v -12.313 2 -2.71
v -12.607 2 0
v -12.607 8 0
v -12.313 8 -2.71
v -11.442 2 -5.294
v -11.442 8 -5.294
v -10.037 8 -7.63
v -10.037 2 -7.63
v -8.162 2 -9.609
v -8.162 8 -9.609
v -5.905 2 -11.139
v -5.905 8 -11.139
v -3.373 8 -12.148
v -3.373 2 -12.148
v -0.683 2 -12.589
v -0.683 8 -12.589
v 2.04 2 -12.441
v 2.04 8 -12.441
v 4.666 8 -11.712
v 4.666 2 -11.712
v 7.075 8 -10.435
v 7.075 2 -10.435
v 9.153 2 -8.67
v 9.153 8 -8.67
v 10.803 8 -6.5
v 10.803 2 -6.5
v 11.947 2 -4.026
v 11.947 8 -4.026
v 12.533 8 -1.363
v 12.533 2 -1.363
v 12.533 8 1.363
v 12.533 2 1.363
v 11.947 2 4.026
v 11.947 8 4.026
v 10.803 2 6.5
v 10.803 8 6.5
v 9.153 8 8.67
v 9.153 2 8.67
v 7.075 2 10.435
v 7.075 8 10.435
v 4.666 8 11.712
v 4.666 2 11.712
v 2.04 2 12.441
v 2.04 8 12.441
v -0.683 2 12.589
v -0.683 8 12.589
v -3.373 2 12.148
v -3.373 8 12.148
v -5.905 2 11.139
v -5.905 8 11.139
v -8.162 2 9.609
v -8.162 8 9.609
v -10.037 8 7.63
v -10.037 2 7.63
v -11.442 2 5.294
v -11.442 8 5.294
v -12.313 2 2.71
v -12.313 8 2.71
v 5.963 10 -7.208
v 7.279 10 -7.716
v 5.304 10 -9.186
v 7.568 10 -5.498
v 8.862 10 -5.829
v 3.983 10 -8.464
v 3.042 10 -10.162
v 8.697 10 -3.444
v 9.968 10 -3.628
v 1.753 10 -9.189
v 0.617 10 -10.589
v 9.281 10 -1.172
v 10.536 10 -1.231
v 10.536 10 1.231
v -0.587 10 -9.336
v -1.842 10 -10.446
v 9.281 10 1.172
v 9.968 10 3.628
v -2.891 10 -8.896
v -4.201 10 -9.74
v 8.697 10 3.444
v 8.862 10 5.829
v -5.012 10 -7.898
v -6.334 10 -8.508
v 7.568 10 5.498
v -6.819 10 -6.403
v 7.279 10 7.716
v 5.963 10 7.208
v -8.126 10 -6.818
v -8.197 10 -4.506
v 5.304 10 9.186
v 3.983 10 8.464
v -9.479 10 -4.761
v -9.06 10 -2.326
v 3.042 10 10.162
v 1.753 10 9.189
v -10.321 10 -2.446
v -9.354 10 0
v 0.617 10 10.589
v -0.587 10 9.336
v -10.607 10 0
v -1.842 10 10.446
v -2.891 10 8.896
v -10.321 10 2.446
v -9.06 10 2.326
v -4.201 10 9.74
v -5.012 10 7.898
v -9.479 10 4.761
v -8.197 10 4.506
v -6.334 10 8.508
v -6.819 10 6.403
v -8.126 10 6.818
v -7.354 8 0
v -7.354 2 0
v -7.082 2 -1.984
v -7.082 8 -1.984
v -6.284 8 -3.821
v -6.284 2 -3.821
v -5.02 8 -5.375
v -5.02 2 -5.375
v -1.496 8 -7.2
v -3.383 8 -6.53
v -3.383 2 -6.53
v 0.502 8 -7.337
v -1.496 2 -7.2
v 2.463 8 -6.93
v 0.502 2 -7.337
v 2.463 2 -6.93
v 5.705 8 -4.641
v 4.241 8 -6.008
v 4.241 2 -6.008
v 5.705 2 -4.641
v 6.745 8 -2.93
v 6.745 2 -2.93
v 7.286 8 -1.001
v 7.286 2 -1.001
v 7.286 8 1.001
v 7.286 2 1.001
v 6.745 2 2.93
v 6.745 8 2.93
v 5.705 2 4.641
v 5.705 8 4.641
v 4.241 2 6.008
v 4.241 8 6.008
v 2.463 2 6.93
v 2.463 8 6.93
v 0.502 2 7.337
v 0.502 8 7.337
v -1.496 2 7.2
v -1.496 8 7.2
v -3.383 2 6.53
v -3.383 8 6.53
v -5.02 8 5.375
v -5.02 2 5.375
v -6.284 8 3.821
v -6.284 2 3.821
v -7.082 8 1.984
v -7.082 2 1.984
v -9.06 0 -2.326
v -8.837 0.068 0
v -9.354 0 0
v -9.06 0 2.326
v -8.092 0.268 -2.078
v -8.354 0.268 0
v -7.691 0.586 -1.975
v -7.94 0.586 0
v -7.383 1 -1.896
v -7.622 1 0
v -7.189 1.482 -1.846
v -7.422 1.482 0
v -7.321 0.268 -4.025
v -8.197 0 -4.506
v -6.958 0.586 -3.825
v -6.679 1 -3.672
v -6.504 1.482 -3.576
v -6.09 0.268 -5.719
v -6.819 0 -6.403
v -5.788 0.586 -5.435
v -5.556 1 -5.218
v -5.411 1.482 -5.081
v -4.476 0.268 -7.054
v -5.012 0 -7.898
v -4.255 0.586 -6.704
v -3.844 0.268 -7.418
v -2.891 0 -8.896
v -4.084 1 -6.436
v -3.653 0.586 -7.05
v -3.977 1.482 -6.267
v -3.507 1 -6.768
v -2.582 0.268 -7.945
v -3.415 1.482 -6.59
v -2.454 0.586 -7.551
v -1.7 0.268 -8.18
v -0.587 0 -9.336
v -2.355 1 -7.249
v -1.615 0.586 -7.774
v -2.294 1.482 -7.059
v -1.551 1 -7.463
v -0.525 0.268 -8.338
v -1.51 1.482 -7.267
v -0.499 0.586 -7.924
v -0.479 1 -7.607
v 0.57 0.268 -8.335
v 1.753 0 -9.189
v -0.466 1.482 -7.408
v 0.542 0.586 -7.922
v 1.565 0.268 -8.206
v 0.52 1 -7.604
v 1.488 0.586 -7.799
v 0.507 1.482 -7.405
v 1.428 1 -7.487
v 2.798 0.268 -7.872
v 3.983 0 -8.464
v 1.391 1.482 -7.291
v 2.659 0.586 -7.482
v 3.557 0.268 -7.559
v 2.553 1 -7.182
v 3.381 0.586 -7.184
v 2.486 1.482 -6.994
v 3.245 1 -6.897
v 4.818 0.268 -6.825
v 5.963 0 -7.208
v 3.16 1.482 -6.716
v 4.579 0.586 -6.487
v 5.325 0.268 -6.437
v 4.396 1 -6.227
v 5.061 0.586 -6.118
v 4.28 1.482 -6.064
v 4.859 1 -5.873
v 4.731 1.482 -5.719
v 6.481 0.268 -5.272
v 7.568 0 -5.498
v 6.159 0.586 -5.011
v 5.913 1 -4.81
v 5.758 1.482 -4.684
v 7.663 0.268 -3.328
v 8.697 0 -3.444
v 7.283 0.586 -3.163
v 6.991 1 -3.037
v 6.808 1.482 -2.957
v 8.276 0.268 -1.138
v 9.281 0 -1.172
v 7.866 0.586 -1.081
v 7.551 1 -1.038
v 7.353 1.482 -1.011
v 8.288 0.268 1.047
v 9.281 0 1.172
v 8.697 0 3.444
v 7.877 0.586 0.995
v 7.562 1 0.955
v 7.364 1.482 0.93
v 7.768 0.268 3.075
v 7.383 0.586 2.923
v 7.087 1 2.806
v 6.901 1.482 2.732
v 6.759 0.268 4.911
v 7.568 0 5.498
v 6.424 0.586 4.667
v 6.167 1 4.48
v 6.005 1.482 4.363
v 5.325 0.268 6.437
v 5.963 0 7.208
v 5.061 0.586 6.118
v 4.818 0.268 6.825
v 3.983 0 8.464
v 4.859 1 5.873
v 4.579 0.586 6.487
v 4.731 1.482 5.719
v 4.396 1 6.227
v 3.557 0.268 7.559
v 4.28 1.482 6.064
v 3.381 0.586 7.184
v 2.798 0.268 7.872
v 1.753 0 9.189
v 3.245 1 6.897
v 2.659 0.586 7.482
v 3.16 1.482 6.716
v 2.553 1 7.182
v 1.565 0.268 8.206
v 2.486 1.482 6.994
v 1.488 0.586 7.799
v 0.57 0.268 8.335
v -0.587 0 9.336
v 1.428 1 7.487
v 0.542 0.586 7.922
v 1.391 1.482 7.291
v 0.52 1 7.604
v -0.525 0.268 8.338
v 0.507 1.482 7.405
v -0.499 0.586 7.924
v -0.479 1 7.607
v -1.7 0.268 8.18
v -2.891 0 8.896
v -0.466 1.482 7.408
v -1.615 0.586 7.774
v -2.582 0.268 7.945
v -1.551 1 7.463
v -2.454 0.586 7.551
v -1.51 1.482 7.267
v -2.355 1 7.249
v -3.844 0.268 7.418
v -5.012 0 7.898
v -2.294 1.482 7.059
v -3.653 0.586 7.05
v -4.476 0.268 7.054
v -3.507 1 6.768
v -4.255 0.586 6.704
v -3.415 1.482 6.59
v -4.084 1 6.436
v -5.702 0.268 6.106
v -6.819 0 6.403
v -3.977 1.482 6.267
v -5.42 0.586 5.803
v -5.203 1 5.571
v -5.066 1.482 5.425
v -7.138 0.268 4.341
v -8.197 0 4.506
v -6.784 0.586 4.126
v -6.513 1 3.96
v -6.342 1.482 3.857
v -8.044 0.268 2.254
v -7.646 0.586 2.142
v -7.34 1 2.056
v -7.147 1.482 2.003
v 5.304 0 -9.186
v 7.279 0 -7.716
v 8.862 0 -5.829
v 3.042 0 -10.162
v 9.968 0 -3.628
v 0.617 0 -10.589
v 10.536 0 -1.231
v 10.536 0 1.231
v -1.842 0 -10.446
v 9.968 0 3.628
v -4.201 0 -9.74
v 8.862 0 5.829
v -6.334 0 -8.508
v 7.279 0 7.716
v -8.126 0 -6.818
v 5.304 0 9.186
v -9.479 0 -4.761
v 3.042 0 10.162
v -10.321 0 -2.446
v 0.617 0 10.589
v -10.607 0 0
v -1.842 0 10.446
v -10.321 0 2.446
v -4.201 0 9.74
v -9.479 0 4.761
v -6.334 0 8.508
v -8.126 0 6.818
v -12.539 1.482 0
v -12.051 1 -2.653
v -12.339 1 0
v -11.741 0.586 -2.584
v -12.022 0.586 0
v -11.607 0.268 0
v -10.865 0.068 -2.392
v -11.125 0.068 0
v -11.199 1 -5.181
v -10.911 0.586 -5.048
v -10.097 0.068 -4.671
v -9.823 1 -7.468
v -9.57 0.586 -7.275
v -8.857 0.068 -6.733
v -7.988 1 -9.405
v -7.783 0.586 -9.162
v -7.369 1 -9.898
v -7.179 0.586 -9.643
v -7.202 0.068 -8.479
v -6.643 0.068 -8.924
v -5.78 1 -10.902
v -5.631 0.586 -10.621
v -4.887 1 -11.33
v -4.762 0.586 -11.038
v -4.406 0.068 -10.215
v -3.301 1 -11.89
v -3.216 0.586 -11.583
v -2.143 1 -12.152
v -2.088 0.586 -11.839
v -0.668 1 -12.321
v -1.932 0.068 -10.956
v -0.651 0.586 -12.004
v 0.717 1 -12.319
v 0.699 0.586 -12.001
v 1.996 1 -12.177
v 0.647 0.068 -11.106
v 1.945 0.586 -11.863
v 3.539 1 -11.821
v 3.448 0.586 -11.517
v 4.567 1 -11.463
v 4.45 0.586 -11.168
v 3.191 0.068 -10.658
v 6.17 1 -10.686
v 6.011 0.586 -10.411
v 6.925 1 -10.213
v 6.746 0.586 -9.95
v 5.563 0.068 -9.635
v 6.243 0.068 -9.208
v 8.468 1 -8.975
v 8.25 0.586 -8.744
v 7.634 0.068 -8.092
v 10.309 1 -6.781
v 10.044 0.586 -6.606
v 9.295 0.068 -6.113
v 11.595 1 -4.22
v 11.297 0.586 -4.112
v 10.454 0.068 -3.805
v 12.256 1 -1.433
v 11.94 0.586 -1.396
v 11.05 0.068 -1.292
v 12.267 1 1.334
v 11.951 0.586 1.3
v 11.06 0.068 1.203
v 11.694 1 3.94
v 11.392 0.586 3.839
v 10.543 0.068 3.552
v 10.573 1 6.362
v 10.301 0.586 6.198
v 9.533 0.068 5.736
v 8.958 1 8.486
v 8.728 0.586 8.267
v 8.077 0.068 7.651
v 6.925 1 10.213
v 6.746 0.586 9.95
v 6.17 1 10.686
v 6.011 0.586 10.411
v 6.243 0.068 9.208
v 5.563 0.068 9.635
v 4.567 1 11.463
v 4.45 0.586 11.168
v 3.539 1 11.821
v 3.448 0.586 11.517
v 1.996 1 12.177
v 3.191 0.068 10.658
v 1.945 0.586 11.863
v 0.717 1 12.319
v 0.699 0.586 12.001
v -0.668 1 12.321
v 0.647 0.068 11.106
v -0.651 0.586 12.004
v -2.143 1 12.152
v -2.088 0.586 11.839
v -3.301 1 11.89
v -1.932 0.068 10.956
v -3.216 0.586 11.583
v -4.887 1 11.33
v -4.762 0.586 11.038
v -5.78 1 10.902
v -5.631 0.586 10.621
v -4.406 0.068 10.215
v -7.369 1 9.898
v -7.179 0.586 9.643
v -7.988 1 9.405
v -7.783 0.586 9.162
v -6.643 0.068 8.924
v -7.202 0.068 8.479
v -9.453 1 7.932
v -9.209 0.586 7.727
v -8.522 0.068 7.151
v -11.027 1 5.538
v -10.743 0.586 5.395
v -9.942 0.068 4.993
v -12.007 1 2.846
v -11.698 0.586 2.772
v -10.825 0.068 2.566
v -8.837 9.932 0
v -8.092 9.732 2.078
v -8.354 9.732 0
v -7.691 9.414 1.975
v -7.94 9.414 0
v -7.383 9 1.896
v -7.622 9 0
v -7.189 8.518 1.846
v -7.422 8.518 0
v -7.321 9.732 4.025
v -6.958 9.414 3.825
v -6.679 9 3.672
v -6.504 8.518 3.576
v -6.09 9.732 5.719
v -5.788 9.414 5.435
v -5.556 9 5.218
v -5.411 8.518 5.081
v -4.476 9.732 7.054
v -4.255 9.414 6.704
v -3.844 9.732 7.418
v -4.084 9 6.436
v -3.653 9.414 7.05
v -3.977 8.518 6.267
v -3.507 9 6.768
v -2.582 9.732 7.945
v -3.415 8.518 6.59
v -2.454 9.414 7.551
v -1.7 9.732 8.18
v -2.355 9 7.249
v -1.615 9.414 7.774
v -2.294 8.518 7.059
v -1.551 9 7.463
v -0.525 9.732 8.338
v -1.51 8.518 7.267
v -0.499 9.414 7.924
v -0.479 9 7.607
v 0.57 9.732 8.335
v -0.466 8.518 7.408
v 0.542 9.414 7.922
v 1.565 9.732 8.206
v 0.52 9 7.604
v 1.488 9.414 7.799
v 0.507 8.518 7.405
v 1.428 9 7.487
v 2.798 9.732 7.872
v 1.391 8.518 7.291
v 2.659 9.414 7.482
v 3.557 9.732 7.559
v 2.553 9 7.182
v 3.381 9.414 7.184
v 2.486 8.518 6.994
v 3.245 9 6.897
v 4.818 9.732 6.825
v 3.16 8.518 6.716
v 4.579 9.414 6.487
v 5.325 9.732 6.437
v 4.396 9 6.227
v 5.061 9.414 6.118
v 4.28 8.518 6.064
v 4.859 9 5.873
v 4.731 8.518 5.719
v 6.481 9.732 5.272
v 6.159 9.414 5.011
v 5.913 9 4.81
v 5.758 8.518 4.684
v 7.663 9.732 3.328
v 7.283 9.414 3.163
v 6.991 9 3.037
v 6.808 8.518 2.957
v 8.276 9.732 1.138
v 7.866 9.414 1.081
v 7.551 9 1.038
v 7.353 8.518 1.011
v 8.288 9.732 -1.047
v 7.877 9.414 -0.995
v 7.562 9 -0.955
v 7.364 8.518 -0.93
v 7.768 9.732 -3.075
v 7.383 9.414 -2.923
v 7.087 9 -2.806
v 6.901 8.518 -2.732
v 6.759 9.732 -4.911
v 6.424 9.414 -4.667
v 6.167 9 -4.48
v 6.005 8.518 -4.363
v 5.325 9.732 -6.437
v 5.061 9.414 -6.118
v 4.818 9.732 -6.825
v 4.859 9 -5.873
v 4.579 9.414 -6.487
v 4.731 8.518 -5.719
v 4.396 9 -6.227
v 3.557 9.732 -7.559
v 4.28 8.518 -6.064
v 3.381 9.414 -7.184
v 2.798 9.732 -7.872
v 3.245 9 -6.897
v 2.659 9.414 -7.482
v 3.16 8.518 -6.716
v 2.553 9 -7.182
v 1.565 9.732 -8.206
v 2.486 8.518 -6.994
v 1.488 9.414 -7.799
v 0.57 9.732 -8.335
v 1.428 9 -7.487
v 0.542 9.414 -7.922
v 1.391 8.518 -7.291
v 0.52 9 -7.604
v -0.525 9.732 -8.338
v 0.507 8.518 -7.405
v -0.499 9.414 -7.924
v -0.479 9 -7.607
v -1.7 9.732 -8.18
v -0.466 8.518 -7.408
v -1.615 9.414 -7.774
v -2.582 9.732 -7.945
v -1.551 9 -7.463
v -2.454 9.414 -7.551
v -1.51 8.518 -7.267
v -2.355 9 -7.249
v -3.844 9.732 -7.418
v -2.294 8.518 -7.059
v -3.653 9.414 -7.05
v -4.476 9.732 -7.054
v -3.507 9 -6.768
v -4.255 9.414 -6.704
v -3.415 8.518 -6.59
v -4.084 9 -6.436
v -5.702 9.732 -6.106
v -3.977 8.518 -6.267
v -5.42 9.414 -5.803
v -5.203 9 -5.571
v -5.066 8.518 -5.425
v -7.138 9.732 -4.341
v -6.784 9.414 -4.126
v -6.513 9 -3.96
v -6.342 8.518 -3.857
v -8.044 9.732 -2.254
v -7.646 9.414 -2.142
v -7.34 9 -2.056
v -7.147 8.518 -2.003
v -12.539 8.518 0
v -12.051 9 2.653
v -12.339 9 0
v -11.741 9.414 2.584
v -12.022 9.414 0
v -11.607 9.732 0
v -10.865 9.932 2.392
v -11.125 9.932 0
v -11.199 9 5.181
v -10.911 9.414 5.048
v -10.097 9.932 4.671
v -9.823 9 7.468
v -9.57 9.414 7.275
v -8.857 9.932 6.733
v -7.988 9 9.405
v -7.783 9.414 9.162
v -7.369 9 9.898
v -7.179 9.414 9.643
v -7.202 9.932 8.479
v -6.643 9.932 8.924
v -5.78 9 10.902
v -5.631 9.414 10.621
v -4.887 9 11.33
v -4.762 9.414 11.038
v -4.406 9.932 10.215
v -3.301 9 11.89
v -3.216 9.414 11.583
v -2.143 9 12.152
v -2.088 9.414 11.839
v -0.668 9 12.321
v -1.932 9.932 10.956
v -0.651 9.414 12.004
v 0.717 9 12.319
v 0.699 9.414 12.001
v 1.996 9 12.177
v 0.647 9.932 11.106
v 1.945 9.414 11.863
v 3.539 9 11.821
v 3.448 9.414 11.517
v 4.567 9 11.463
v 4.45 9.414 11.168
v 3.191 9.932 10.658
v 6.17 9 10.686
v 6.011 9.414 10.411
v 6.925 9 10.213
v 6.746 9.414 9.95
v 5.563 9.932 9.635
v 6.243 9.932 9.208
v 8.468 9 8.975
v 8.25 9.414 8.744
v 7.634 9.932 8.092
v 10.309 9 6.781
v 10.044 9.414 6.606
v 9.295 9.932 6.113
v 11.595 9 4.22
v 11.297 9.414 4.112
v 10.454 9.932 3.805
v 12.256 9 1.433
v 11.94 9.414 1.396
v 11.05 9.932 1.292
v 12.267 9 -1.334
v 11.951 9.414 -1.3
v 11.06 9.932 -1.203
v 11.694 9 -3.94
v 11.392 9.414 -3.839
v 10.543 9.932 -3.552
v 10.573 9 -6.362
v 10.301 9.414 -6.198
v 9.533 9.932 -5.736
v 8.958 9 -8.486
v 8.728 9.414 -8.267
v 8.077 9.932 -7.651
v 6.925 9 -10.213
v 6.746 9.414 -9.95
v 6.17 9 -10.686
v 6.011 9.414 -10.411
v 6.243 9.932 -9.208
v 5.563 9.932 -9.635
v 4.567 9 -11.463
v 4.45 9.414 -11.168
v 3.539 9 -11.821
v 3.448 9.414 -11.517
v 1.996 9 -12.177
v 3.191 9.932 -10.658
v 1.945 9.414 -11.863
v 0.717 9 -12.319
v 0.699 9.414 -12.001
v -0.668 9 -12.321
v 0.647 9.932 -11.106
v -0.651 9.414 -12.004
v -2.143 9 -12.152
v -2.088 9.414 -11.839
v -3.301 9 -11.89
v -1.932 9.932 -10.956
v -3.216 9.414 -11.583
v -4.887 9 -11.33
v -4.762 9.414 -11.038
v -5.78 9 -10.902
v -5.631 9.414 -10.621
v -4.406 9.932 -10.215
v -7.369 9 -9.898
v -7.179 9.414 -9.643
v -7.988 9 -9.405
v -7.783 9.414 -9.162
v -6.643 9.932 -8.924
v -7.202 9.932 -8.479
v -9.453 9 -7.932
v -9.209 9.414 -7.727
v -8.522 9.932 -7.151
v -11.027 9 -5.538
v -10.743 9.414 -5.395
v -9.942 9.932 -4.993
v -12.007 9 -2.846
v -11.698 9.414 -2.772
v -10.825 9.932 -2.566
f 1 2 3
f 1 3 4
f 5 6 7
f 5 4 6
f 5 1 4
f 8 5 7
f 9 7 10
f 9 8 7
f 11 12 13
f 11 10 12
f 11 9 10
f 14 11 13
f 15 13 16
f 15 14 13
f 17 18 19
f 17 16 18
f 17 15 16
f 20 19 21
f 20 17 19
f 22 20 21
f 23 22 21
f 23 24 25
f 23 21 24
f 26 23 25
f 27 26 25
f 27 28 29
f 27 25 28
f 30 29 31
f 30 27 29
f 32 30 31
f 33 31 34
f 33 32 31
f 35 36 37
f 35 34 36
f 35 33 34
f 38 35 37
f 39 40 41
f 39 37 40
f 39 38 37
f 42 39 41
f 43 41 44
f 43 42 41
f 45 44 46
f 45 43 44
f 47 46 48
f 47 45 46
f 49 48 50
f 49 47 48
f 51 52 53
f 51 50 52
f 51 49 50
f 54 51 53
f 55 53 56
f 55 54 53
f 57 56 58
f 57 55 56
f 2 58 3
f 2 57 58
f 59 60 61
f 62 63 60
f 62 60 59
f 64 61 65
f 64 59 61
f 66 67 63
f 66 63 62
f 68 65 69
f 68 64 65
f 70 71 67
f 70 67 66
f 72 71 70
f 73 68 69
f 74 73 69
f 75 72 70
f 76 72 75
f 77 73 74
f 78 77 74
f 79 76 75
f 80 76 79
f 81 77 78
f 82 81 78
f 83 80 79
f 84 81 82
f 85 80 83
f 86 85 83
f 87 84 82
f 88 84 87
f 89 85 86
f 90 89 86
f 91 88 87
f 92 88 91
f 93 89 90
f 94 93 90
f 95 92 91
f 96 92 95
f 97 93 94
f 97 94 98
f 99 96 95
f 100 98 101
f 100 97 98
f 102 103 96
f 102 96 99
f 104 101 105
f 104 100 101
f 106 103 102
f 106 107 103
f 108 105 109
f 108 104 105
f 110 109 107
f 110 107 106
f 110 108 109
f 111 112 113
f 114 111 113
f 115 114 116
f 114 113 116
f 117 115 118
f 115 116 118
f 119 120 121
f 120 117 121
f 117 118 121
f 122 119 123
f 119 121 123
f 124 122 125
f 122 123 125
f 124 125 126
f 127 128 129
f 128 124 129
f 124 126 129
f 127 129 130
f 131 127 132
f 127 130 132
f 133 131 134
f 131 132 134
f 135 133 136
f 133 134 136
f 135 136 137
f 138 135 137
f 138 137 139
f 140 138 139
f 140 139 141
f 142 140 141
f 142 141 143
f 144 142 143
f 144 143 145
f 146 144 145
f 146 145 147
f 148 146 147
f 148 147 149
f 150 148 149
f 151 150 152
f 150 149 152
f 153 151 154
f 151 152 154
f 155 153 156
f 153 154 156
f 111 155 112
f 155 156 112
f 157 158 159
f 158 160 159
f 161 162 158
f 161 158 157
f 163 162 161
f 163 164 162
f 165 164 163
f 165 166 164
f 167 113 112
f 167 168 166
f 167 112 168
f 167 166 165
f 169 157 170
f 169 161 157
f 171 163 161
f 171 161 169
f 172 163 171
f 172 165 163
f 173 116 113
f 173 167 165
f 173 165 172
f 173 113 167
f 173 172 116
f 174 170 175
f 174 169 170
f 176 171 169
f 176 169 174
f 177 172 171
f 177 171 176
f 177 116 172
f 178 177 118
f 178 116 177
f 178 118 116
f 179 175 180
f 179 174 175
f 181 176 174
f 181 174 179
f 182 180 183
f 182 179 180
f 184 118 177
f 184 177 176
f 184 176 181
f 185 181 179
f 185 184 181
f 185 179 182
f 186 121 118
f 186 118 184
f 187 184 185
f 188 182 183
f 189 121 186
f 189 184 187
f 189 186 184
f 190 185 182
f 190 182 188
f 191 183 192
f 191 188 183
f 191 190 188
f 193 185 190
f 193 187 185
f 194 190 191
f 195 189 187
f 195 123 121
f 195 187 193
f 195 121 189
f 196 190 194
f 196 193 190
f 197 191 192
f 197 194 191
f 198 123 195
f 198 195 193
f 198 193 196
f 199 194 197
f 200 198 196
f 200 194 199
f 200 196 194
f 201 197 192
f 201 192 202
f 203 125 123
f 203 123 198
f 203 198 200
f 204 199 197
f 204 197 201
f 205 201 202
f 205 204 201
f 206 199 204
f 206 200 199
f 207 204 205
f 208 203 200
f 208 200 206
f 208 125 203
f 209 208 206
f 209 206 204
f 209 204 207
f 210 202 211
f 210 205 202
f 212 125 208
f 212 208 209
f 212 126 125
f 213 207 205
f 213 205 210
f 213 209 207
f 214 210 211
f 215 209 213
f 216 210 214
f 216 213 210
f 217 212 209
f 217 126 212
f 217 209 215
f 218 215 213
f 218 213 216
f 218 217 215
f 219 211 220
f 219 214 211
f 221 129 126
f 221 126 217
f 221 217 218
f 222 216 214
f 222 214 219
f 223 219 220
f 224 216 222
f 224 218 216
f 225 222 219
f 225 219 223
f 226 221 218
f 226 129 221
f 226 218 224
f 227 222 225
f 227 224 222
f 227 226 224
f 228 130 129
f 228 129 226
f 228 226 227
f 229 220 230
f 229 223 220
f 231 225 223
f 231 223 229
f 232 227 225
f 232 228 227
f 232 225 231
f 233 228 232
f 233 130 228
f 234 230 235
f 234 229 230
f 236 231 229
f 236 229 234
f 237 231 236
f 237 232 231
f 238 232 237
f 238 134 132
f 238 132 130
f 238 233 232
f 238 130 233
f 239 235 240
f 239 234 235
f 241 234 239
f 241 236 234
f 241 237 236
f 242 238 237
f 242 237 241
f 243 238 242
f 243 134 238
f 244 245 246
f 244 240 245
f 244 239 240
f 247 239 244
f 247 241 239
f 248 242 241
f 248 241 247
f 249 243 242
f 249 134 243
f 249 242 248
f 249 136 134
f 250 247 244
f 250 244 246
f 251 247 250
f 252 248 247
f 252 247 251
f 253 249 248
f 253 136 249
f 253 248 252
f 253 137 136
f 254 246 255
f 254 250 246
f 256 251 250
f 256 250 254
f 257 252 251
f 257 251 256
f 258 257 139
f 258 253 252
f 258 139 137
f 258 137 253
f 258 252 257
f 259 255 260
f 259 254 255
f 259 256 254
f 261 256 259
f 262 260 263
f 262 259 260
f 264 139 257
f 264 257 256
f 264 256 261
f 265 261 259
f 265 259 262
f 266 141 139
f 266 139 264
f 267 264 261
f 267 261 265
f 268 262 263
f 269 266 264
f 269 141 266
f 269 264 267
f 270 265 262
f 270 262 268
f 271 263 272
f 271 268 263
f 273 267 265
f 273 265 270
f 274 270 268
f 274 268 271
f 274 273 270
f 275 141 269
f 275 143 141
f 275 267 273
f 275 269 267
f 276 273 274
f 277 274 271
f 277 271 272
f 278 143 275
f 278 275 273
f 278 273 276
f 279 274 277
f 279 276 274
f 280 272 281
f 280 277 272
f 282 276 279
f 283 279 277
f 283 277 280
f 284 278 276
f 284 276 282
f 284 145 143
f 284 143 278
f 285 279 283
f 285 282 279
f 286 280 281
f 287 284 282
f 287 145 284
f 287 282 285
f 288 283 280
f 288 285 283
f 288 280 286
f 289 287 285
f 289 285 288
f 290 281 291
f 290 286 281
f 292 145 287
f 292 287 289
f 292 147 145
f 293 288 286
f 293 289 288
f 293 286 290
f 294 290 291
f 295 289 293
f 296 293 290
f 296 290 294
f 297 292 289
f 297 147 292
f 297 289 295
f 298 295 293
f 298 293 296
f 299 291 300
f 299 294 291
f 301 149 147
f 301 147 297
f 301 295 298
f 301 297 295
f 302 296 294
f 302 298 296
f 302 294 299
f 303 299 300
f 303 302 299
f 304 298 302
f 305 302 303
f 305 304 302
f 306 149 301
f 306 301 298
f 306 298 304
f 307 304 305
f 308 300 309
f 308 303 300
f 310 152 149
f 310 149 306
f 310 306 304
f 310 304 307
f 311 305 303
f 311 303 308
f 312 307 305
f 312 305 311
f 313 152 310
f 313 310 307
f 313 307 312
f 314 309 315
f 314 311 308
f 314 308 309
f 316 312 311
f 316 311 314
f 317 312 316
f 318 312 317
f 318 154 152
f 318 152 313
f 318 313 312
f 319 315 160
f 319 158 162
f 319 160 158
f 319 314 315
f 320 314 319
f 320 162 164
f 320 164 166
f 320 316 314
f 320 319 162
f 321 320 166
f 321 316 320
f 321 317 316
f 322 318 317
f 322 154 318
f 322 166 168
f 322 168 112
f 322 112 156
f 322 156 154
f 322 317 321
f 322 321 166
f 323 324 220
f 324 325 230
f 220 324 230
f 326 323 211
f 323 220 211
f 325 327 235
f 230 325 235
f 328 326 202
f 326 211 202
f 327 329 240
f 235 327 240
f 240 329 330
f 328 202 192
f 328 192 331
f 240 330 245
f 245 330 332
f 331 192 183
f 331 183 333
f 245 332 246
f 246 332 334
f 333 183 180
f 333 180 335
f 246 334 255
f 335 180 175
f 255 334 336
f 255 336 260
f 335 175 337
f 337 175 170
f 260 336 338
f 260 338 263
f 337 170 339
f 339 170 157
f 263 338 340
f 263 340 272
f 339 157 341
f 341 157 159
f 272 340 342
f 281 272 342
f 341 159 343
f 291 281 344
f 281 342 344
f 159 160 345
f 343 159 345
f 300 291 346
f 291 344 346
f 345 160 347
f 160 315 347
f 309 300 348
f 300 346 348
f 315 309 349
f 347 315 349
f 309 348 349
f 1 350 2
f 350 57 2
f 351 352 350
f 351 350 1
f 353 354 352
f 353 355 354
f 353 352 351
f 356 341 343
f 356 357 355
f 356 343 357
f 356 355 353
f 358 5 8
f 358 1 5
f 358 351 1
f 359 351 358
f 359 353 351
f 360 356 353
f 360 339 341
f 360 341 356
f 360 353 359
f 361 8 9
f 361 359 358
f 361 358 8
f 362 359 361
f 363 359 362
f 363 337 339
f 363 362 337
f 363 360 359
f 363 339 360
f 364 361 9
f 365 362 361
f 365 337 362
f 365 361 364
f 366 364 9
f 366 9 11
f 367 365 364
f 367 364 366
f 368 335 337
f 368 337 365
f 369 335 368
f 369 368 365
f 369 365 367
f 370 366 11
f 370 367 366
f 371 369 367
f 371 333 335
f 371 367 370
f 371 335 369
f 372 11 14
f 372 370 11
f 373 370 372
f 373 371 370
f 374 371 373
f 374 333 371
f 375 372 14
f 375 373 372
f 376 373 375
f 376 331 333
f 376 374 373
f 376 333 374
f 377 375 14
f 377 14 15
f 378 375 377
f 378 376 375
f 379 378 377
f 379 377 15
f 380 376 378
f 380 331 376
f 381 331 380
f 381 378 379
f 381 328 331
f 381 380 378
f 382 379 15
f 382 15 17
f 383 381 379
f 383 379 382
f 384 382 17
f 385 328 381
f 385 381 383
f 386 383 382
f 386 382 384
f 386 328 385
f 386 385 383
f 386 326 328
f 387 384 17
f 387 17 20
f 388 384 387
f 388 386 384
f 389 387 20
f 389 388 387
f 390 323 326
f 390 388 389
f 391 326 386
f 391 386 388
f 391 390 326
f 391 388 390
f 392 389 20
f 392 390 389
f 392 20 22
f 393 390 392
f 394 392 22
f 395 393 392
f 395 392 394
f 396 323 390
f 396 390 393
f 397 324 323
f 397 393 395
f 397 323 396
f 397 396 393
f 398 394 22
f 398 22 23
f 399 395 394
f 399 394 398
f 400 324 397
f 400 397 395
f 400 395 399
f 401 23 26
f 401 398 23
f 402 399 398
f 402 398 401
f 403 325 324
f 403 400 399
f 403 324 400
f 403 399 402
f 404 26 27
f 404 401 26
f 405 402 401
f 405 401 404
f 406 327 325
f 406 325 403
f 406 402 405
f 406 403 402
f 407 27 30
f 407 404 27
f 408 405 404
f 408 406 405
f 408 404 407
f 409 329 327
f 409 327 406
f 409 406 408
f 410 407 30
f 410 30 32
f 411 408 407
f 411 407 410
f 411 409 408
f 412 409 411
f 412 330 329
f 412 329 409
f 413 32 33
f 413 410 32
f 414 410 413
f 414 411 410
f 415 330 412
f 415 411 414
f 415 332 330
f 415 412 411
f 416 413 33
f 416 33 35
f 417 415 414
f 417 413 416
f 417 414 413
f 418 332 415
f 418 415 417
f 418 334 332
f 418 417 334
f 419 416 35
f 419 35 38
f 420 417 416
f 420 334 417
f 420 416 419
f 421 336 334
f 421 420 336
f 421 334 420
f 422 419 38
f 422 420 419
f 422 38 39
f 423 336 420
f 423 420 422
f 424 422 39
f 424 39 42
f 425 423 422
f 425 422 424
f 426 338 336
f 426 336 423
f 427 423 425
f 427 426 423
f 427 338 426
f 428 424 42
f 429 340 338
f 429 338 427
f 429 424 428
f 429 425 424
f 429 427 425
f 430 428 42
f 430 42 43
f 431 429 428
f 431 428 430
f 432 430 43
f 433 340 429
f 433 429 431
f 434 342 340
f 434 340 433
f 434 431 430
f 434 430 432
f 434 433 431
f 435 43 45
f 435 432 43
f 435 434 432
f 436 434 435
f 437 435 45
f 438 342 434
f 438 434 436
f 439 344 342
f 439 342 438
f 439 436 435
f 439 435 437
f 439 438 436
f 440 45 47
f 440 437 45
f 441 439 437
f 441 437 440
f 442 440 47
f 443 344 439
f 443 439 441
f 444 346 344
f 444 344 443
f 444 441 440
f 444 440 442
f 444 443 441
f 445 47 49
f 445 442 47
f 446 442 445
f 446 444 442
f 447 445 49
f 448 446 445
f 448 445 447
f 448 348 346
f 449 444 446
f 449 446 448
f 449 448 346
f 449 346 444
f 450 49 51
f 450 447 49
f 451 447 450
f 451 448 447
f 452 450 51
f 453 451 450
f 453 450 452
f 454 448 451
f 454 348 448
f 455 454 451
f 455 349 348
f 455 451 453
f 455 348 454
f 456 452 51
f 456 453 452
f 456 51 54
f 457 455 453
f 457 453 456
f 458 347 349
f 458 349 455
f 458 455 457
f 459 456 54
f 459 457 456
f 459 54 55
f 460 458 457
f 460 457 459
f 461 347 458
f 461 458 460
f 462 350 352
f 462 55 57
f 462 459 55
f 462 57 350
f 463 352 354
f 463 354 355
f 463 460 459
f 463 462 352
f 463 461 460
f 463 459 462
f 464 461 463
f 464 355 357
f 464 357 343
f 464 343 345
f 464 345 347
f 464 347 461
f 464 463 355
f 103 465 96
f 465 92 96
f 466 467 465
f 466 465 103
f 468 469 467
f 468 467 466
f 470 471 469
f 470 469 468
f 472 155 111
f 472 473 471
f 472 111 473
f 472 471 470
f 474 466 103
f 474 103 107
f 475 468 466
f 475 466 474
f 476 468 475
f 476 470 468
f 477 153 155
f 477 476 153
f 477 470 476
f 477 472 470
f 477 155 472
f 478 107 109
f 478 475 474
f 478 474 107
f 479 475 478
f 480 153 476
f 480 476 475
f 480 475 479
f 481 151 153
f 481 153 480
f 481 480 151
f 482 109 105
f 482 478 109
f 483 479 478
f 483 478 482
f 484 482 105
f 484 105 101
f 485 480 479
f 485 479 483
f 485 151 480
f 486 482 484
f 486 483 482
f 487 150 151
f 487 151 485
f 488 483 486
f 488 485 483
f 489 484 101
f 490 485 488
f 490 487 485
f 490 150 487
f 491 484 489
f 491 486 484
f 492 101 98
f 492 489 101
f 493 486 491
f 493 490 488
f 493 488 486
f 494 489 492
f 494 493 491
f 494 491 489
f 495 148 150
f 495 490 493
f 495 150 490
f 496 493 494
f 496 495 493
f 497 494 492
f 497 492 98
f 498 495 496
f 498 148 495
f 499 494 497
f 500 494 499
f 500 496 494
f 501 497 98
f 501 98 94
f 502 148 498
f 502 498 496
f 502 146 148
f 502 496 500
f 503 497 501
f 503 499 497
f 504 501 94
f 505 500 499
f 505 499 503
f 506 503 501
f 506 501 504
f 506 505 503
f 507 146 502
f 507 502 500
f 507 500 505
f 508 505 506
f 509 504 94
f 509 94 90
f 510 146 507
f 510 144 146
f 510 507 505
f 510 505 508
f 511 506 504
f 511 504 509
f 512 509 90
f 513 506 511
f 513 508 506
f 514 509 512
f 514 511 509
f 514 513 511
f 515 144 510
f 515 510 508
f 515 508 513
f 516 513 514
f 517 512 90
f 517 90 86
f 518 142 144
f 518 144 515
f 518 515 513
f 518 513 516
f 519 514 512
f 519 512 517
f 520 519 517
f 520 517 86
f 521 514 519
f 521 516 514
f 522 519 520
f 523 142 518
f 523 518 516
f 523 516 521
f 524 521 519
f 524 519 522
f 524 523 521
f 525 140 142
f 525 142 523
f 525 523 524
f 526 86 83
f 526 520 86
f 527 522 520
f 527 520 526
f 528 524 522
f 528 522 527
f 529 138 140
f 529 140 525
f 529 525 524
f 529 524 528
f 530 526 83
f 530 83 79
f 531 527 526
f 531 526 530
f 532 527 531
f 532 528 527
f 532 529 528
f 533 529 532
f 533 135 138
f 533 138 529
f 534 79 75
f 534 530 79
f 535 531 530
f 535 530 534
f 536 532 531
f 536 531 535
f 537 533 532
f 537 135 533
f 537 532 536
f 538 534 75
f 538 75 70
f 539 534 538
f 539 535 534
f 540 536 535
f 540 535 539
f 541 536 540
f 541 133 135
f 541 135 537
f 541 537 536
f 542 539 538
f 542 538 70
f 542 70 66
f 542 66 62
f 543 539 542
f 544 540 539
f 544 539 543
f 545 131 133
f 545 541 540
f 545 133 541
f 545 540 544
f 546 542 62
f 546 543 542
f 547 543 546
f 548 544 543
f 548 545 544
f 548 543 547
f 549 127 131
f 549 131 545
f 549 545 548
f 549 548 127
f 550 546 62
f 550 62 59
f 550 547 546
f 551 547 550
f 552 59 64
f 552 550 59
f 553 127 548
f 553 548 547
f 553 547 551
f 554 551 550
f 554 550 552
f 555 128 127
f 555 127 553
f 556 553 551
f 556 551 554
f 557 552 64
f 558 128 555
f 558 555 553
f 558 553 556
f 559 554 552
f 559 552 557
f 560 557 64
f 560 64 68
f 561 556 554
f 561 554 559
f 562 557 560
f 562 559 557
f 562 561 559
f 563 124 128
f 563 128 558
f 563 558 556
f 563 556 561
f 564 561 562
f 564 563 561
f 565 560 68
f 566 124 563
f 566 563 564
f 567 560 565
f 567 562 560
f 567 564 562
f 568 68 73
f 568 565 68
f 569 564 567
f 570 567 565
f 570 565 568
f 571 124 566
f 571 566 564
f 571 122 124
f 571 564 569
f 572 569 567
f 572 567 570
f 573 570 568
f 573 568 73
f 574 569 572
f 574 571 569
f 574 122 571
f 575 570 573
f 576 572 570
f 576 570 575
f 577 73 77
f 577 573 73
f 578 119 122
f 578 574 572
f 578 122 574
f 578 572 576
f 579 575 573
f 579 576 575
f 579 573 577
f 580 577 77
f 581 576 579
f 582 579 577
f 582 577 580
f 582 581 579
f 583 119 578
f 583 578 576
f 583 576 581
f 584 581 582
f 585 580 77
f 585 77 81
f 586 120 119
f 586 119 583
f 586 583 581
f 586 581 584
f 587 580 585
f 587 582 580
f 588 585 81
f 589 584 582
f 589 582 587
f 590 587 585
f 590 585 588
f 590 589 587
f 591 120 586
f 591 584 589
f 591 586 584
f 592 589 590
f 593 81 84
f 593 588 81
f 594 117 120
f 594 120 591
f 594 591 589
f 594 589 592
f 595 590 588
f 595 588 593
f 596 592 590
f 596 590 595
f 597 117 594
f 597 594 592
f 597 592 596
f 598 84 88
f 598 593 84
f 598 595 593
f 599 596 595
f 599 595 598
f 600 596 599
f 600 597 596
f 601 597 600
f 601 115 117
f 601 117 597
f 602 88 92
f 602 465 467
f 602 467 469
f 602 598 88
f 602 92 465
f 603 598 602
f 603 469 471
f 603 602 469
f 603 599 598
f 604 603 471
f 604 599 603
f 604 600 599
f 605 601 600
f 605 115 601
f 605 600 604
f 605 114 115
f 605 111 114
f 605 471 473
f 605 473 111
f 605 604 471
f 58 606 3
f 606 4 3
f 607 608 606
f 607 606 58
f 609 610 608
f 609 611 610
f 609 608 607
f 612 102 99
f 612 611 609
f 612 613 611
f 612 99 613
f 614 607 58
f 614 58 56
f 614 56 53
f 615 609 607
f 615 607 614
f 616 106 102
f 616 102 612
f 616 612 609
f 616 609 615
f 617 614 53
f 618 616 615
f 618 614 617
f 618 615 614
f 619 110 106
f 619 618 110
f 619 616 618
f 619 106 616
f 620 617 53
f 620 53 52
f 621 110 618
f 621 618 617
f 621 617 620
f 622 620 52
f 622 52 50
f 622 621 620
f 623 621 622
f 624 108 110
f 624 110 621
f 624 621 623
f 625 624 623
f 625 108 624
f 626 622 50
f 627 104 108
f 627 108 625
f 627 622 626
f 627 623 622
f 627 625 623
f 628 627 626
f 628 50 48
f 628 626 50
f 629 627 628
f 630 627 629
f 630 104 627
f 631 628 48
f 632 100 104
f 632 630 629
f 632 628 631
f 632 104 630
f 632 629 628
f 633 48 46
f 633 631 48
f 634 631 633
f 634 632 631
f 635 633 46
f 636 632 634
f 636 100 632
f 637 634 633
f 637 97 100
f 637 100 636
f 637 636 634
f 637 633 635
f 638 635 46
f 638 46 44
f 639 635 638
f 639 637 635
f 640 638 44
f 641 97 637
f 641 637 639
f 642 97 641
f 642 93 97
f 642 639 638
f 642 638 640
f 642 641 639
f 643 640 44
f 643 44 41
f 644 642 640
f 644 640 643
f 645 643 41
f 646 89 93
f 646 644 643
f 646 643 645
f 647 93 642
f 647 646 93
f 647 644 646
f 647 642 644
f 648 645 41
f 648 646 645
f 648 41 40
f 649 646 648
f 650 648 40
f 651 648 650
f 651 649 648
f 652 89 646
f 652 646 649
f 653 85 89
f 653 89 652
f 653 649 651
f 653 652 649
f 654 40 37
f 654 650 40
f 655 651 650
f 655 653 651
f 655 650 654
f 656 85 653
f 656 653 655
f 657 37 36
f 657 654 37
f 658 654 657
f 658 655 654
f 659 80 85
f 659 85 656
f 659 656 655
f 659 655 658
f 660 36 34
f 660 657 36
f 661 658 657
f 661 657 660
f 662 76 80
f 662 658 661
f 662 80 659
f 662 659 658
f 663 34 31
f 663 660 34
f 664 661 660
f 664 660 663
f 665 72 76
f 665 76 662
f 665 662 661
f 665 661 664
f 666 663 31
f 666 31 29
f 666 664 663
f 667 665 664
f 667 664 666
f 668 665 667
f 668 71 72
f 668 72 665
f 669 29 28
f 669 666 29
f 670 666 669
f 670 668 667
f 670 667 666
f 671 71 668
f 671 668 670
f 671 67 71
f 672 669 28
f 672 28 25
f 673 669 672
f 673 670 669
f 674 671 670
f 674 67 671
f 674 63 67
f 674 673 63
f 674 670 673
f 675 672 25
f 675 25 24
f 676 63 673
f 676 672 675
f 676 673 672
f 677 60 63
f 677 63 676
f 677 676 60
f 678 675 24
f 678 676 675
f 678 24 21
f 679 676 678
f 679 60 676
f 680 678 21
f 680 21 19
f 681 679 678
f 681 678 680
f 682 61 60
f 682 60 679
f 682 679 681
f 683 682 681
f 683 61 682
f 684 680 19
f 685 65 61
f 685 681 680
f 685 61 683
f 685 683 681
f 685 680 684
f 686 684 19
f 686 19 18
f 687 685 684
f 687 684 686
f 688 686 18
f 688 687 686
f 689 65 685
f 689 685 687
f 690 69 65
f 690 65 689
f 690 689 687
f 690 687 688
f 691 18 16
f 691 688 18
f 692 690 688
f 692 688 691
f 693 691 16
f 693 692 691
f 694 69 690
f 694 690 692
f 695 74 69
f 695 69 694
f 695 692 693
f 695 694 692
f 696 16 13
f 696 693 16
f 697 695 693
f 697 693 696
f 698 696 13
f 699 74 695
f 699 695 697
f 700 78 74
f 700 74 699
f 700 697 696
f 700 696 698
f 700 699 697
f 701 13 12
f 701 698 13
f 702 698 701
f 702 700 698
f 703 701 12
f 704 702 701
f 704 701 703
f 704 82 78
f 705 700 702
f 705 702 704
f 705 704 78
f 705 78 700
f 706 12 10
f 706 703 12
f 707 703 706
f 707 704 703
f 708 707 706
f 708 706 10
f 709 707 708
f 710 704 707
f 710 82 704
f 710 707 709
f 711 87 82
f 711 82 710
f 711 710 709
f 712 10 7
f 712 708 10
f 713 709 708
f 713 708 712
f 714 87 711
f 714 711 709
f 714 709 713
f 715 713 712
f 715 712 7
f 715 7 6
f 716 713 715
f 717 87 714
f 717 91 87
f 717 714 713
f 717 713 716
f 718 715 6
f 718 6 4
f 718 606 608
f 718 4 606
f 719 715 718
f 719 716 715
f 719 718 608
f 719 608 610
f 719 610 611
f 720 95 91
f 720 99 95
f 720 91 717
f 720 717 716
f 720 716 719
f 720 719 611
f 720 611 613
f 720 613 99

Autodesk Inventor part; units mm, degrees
ref_plane "YZ Plane" through (0, 0, 0) normal (1, 0, 0) x (0, 1, 0)
ref_plane "XZ Plane" through (0, 0, 0) normal (0, 1, 0) x (-1, 0, 0)
ref_plane "XY Plane" through (0, 0, 0) normal (0, 0, 1) x (1, 0, 0)
sketch "Sketch1" plane through (0, 0, 0) normal (0, 1, 0) x (-1, 0, 0)
  circle A0 centre (0, 0) radius 12.6074
  circle A1 centre (0, 0) radius 7.3543
extrude "Extrusion1" add sketch "Sketch1" along normal blind 10
fillet "Fillet1" radius 2 2 edges at (12.6074, 10, 0) (12.6074, 0, 0)
fillet "Fillet2" radius 2 2 edges at (7.3543, 10, 0) (7.3543, 0, 0)
